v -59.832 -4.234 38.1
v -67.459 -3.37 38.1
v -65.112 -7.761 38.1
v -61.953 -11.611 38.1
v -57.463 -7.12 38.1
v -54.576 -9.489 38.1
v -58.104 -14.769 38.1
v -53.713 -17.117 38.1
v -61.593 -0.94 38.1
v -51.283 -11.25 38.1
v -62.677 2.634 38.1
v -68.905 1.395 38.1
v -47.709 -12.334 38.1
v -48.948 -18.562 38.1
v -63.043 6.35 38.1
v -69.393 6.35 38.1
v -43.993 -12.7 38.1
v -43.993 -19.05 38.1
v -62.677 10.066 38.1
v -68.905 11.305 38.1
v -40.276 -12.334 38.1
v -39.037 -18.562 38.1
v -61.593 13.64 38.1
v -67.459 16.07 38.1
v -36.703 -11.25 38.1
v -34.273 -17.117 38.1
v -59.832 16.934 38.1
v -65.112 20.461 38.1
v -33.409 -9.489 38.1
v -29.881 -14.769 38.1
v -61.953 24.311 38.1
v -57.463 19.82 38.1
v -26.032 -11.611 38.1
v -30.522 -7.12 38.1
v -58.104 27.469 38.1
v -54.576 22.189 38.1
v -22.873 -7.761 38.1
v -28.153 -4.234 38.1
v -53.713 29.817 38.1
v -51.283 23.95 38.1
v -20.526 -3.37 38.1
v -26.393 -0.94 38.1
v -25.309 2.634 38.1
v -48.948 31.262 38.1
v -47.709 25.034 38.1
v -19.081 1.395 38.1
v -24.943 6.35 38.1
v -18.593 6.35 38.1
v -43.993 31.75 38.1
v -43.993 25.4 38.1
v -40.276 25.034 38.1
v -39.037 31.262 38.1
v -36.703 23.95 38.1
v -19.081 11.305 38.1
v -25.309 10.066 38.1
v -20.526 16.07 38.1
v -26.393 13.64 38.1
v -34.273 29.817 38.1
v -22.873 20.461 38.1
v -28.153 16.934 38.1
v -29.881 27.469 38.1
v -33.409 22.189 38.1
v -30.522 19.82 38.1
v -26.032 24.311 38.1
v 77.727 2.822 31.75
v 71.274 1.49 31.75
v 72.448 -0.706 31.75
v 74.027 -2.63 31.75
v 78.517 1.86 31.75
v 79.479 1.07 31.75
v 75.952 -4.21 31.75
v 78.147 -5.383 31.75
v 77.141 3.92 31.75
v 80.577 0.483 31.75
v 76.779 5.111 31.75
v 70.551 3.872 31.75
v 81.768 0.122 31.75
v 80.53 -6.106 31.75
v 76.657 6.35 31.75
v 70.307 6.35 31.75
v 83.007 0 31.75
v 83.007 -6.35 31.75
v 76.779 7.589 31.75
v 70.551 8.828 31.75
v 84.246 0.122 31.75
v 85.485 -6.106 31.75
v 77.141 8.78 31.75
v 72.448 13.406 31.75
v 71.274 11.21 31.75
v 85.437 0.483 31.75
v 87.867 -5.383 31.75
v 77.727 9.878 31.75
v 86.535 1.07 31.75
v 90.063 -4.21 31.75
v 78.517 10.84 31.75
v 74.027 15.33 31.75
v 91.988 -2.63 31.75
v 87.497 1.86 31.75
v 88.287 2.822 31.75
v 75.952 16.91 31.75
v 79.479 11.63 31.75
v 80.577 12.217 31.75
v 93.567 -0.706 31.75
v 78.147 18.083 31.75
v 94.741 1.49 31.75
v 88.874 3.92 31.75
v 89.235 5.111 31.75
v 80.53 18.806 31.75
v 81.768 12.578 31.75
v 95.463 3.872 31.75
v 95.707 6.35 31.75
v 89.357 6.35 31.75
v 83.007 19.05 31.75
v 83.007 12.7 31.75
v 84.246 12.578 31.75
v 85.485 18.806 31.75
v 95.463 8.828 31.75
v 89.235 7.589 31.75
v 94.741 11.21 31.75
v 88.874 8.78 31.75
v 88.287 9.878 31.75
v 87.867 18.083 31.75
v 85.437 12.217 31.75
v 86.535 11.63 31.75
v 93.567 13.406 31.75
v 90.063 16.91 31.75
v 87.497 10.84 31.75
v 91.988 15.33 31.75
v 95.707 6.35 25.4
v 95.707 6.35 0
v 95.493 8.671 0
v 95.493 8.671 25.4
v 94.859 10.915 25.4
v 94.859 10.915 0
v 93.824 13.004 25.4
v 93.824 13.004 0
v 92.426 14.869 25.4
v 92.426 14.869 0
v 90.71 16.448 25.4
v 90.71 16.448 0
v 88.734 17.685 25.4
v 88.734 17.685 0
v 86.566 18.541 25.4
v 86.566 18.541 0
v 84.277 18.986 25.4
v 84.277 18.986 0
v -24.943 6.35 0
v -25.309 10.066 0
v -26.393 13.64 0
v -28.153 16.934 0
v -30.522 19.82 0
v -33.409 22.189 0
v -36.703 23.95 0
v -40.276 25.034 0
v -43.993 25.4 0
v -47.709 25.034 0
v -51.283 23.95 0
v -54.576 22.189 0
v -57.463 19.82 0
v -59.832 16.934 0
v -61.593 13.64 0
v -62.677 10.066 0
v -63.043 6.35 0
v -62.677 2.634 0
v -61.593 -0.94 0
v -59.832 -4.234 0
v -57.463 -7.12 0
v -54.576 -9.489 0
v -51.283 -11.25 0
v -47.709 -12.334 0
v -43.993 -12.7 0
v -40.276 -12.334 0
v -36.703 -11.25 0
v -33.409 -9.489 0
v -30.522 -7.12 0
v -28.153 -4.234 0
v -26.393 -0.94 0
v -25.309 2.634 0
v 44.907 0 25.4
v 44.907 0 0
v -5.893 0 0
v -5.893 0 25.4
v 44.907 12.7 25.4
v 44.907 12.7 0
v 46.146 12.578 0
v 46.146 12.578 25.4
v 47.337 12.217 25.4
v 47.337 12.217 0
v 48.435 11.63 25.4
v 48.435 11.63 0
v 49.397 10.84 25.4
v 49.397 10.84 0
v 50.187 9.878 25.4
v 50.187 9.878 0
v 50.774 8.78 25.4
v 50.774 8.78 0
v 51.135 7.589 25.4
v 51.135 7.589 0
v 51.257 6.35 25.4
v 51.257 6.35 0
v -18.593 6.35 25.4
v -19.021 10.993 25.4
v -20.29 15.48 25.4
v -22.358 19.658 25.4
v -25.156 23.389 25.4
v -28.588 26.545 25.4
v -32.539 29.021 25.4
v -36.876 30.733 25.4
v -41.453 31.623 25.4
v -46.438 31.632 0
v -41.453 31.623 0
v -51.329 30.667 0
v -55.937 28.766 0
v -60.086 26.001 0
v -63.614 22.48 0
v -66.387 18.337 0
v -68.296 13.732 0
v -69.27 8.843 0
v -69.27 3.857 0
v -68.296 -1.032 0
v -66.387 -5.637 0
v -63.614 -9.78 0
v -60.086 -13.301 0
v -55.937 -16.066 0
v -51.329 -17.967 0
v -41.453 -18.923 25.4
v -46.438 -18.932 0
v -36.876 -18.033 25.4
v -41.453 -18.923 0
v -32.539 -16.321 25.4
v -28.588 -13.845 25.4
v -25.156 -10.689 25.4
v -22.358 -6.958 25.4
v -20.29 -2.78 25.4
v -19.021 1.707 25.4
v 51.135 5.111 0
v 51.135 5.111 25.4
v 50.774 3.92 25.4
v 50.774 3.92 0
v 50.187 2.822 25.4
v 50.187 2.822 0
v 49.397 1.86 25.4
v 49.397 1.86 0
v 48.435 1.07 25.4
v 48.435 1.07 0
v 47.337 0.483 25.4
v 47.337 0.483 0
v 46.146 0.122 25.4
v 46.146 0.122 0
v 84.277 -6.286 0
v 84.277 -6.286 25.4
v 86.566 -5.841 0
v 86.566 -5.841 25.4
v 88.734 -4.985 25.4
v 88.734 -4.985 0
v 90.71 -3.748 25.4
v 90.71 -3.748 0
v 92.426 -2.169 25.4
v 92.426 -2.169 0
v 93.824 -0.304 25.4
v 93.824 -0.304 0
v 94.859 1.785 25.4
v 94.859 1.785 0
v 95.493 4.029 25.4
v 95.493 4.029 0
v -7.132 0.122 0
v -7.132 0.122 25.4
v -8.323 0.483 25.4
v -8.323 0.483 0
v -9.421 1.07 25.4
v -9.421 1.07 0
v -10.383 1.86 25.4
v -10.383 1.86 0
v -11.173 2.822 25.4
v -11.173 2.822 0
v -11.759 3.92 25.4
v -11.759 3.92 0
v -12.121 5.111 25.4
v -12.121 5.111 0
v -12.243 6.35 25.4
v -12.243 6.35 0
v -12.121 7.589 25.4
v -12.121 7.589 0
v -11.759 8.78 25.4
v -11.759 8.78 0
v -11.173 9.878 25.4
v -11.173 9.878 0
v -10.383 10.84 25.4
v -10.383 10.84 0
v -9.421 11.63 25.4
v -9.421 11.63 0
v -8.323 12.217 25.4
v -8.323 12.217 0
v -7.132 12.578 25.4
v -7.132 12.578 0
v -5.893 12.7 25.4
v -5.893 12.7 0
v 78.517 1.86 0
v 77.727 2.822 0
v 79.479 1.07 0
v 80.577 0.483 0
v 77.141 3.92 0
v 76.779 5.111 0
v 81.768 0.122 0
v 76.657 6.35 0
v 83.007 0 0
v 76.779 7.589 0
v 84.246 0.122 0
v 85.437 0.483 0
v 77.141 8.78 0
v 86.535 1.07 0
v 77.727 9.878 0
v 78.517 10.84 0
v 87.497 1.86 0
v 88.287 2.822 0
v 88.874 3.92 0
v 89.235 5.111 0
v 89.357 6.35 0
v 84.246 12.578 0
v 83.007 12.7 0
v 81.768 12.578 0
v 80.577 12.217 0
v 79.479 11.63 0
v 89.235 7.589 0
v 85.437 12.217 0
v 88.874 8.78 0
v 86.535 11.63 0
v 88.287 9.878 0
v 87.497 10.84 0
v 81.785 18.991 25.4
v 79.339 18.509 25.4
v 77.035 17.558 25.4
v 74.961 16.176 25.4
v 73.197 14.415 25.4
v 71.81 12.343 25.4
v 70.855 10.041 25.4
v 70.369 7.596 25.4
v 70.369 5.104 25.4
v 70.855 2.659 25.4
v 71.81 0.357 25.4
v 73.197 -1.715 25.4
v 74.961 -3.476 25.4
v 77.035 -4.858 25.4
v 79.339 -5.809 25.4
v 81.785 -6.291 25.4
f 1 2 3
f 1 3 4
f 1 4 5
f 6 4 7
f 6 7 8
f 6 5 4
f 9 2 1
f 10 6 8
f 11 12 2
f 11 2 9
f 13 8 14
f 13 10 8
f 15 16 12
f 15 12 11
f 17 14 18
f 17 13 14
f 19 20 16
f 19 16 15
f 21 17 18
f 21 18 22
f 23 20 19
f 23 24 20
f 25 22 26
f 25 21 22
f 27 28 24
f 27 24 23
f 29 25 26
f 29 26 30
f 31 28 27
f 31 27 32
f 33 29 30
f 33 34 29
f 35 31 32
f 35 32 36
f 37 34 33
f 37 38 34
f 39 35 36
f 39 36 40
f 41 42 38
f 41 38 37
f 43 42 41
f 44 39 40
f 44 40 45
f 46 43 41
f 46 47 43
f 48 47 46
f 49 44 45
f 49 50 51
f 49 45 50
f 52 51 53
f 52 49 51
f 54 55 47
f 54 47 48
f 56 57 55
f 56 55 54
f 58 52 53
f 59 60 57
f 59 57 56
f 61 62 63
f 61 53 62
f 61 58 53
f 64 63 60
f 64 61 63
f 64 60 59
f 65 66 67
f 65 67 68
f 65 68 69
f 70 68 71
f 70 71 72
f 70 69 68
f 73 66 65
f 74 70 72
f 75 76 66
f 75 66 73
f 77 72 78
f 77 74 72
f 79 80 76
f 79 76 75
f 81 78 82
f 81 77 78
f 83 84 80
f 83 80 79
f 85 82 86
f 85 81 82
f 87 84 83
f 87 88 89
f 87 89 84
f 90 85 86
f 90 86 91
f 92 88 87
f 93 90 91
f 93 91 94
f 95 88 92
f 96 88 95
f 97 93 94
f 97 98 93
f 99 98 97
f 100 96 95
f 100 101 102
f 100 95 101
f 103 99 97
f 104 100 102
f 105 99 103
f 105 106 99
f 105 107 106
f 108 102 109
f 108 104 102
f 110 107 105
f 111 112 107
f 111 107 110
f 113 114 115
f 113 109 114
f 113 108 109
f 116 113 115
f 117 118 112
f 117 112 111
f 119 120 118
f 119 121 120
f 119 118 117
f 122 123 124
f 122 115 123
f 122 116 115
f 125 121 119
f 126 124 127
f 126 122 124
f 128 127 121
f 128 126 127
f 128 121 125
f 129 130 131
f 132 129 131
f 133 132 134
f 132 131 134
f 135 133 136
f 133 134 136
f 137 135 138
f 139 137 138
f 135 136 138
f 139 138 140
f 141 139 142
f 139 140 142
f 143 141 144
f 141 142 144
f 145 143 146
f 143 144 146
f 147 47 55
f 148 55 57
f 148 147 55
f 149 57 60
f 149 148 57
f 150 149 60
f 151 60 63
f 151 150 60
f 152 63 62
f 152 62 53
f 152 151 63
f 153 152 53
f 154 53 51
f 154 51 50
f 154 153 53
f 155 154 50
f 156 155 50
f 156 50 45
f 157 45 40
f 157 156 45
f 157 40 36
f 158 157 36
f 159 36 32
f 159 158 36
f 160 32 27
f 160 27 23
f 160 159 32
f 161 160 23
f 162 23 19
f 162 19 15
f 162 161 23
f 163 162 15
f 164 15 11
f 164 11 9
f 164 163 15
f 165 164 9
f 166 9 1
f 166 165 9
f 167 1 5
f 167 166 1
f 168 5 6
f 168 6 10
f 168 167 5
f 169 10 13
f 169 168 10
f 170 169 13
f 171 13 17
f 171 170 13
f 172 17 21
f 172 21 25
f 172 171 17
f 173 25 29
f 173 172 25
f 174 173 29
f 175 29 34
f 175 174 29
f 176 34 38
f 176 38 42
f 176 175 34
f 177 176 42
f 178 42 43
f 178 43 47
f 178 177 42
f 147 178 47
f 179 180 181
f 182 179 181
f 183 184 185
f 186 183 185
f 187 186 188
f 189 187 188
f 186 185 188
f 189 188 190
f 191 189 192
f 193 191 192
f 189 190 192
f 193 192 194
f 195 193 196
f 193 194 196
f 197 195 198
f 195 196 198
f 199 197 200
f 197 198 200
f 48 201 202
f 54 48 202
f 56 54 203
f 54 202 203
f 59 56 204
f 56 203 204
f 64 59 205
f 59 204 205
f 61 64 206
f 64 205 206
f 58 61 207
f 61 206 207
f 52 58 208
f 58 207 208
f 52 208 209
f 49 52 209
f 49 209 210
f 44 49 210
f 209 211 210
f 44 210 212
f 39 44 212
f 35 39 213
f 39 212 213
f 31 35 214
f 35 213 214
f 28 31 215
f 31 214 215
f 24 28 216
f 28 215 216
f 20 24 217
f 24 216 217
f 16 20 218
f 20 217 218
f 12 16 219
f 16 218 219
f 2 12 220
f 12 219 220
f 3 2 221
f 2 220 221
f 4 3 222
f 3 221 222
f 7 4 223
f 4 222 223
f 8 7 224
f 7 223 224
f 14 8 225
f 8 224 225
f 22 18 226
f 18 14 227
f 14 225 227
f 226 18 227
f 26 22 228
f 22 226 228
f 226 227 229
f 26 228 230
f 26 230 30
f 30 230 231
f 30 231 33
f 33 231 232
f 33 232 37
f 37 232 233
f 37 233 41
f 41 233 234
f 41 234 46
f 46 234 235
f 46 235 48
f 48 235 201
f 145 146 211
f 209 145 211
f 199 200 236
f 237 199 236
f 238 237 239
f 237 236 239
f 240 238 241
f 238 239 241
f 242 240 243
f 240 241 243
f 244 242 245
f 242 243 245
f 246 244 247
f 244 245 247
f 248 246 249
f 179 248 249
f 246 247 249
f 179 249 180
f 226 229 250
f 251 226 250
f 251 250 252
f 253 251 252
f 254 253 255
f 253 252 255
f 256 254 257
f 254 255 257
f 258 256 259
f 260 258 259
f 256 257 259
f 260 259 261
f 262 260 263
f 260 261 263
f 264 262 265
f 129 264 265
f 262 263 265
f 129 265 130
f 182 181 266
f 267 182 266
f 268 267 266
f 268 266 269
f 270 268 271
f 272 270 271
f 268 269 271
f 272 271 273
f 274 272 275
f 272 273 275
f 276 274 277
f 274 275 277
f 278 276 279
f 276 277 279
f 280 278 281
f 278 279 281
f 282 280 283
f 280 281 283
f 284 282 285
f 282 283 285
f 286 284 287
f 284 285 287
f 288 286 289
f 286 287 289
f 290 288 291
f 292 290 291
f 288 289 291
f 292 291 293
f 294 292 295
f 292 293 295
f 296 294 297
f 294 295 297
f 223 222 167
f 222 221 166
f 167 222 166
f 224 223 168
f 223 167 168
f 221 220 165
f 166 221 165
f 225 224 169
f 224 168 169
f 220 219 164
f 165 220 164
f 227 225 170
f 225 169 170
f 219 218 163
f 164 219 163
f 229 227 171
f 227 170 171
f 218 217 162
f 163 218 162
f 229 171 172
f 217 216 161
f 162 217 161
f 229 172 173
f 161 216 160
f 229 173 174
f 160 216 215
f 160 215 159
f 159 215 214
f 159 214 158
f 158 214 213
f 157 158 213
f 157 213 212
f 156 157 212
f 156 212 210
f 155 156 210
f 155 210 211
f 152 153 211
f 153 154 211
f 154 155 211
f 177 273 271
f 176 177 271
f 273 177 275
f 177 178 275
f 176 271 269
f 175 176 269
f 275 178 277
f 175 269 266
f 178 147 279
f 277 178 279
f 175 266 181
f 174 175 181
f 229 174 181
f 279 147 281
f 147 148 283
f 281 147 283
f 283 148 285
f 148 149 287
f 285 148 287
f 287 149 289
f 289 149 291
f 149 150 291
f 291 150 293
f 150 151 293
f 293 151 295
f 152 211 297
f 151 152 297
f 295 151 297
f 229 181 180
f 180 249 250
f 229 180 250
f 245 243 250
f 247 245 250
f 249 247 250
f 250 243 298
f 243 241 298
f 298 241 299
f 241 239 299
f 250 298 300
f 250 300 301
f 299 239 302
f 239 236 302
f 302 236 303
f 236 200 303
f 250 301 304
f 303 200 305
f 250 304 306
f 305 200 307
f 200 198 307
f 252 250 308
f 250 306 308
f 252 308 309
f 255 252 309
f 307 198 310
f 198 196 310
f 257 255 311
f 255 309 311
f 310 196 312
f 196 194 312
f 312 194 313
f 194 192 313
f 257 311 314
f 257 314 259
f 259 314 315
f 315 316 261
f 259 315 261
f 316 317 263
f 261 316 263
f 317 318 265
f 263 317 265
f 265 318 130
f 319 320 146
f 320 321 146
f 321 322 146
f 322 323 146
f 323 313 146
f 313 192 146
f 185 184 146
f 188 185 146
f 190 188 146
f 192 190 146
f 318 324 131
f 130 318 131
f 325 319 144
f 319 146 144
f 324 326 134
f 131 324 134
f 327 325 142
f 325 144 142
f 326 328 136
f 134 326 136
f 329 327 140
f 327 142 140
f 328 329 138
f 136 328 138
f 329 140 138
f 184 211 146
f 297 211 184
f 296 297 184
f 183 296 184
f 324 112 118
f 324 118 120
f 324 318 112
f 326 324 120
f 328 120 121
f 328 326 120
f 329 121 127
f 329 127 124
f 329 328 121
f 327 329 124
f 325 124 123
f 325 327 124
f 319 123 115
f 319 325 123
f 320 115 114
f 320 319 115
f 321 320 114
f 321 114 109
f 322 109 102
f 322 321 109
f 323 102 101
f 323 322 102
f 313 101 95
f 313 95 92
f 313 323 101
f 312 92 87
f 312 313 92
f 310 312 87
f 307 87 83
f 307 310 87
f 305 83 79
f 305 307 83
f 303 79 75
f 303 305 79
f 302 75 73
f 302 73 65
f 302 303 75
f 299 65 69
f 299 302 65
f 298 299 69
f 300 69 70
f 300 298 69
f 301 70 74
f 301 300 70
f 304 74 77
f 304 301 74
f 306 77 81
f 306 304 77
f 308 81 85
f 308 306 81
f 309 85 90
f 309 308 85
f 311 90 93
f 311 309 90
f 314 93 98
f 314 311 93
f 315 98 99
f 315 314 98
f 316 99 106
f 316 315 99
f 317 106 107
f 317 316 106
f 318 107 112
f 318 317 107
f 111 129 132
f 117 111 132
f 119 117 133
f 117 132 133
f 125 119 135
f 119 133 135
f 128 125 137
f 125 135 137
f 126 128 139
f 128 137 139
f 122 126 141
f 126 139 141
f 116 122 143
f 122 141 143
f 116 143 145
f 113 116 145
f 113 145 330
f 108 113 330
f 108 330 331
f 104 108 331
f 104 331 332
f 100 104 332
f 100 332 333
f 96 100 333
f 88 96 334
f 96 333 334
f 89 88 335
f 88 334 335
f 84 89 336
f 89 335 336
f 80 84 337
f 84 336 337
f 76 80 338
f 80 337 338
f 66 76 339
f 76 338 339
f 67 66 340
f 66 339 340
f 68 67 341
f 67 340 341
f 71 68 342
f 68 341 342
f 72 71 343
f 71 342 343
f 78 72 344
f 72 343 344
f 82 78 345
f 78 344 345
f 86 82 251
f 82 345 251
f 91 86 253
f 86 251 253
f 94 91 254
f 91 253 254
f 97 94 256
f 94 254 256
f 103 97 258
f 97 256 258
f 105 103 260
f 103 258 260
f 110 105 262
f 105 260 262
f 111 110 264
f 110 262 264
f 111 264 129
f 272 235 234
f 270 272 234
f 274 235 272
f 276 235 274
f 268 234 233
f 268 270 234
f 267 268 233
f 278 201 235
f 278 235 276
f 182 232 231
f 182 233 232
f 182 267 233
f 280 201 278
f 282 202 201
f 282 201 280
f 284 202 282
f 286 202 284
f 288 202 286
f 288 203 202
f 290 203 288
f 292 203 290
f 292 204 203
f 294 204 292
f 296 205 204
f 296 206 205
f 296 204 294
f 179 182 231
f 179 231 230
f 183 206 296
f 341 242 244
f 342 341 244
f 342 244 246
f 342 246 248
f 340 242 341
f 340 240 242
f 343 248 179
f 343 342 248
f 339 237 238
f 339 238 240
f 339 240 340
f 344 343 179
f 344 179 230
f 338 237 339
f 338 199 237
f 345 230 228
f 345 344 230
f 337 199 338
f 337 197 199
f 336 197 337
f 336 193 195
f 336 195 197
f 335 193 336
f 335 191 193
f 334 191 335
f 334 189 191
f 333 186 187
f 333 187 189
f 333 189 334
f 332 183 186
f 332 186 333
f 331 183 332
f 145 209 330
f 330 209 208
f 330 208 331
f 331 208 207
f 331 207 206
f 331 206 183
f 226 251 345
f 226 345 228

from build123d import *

# Parameters (mm, degrees)
F0_R     = 19.05
F0_R_2   = 6.35
F1_DEPTH = 25.4
F2_R     = 25.4
F2_R_2   = 19.05
F3_DEPTH = 12.7
F4_R     = 12.7
F4_R_2   = 6.35
F5_DEPTH = 6.35


with BuildPart() as f1:
    # F0 (on Top) → F1 (new body)
    with BuildSketch(Plane.XY):
        with BuildLine():
            ThreePointArc((-41.452724, -18.922681), (-25.15558, -10.688838), (-18.592724, 6.35))
            ThreePointArc((-18.592724, 6.35), (-25.15558, 23.388838), (-41.452724, 31.622681))
            ThreePointArc((-41.452724, 31.622681), (-69.392724, 6.35), (-41.452724, -18.922681))
        make_face()
        with Locations((-43.992724, 6.35)):
            Circle(F0_R, mode=Mode.SUBTRACT)
        with BuildLine():
            ThreePointArc((-41.452724, 31.622681), (-25.15558, 23.388838), (-18.592724, 6.35))
            ThreePointArc((-18.592724, 6.35), (-25.15558, -10.688838), (-41.452724, -18.922681))
            Line((-41.452724, -18.922681), (84.277276, -6.28634))
            ThreePointArc((84.277276, -6.28634), (70.307276, 6.35), (84.277276, 18.98634))
            Line((84.277276, 18.98634), (-41.452724, 31.622681))
        make_face()
        with BuildLine():
            ThreePointArc((-5.892724, 0), (-12.242724, 6.35), (-5.892724, 12.7))
            Line((-5.892724, 12.7), (44.907276, 12.7))
            ThreePointArc((44.907276, 12.7), (49.397404, 10.840128), (51.257276, 6.35))
            ThreePointArc((51.257276, 6.35), (49.397404, 1.859872), (44.907276, 0))
            Line((44.907276, 0), (-5.892724, 0))
        make_face(mode=Mode.SUBTRACT)
        with BuildLine():
            ThreePointArc((95.707276, 6.35), (92.425848, 14.869419), (84.277276, 18.98634))
            ThreePointArc((84.277276, 18.98634), (70.307276, 6.35), (84.277276, -6.28634))
            ThreePointArc((84.277276, -6.28634), (92.425848, -2.169419), (95.707276, 6.35))
        make_face()
        with Locations((83.007276, 6.35)):
            Circle(F0_R_2, mode=Mode.SUBTRACT)
    extrude(amount=F1_DEPTH)

    # F2 (on face) → F3 (join)
    with BuildSketch(Plane.XY.offset(25.4)):
        with Locations((-43.992724, 6.35)):
            Circle(F2_R)
        with Locations((-43.992724, 6.35)):
            Circle(F2_R_2, mode=Mode.SUBTRACT)
    extrude(amount=F3_DEPTH)

    # F4 (on face) → F5 (join)
    with BuildSketch(Plane.XY.offset(25.4)):
        with Locations((83.007276, 6.35)):
            Circle(F4_R)
        with Locations((83.007276, 6.35)):
            Circle(F4_R_2, mode=Mode.SUBTRACT)
    extrude(amount=F5_DEPTH)


solid = f1.part
